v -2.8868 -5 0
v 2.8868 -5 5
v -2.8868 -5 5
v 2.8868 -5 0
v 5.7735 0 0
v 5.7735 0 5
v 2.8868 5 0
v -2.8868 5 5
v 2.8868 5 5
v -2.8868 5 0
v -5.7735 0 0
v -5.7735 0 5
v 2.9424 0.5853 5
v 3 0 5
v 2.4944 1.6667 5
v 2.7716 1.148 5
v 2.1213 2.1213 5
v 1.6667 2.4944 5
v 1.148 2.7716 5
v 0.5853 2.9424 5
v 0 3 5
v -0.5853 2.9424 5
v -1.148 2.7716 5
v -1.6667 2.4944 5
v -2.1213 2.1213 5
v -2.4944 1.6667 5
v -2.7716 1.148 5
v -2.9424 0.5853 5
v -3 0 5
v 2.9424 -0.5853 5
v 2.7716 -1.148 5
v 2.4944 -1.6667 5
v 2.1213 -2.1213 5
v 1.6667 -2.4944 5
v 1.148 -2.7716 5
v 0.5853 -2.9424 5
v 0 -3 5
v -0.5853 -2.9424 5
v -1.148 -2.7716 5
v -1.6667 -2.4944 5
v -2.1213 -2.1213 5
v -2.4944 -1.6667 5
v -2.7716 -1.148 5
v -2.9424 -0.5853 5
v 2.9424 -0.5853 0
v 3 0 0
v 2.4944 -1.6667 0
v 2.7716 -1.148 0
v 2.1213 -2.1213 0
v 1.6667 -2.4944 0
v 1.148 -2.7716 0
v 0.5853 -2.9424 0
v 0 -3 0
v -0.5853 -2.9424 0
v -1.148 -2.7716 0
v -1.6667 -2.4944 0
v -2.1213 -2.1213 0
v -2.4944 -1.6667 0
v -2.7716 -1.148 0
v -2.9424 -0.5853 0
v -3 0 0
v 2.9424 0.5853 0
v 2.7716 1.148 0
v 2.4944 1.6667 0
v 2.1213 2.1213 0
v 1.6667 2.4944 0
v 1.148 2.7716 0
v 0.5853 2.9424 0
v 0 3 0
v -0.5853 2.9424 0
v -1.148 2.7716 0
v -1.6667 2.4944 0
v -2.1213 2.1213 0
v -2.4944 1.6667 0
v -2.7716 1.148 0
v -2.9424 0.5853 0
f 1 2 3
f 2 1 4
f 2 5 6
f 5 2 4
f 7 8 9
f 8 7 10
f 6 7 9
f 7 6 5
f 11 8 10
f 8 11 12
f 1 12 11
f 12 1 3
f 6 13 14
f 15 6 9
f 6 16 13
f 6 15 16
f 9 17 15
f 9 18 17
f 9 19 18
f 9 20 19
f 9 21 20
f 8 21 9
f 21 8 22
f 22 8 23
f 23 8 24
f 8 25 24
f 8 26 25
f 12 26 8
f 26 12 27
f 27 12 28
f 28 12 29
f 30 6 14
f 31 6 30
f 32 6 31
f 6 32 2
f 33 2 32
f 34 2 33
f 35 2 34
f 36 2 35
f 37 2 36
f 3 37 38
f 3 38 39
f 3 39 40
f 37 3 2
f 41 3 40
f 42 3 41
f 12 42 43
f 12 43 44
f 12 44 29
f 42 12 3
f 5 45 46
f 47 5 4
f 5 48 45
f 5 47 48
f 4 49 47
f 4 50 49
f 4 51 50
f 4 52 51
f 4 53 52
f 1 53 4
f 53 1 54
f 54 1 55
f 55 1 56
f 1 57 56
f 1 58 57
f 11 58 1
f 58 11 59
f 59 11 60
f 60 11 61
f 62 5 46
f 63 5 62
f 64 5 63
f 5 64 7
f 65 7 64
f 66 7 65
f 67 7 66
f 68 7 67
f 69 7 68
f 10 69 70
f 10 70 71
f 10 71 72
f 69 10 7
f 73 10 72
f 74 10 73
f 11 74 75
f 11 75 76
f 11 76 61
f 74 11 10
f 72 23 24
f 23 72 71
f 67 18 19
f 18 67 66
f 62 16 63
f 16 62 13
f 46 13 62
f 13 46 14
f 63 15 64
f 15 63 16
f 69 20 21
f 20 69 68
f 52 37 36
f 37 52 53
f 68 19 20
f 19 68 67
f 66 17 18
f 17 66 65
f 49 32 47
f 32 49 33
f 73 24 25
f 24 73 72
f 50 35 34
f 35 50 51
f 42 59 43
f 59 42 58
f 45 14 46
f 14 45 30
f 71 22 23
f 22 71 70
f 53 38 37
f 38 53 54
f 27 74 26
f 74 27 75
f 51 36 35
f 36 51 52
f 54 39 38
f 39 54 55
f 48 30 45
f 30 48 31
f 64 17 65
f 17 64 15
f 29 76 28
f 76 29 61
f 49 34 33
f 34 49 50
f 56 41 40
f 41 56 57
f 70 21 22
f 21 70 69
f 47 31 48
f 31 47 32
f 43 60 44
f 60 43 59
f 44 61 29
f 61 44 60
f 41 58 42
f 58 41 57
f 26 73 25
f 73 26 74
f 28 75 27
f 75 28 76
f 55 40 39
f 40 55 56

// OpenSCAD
// Purchased hardware envelope; no modeled threads, not print.
$fn=32;
difference(){cylinder(d=10/cos(30),h=5,$fn=6);translate([0,0,-1])cylinder(d=6,h=7);}
